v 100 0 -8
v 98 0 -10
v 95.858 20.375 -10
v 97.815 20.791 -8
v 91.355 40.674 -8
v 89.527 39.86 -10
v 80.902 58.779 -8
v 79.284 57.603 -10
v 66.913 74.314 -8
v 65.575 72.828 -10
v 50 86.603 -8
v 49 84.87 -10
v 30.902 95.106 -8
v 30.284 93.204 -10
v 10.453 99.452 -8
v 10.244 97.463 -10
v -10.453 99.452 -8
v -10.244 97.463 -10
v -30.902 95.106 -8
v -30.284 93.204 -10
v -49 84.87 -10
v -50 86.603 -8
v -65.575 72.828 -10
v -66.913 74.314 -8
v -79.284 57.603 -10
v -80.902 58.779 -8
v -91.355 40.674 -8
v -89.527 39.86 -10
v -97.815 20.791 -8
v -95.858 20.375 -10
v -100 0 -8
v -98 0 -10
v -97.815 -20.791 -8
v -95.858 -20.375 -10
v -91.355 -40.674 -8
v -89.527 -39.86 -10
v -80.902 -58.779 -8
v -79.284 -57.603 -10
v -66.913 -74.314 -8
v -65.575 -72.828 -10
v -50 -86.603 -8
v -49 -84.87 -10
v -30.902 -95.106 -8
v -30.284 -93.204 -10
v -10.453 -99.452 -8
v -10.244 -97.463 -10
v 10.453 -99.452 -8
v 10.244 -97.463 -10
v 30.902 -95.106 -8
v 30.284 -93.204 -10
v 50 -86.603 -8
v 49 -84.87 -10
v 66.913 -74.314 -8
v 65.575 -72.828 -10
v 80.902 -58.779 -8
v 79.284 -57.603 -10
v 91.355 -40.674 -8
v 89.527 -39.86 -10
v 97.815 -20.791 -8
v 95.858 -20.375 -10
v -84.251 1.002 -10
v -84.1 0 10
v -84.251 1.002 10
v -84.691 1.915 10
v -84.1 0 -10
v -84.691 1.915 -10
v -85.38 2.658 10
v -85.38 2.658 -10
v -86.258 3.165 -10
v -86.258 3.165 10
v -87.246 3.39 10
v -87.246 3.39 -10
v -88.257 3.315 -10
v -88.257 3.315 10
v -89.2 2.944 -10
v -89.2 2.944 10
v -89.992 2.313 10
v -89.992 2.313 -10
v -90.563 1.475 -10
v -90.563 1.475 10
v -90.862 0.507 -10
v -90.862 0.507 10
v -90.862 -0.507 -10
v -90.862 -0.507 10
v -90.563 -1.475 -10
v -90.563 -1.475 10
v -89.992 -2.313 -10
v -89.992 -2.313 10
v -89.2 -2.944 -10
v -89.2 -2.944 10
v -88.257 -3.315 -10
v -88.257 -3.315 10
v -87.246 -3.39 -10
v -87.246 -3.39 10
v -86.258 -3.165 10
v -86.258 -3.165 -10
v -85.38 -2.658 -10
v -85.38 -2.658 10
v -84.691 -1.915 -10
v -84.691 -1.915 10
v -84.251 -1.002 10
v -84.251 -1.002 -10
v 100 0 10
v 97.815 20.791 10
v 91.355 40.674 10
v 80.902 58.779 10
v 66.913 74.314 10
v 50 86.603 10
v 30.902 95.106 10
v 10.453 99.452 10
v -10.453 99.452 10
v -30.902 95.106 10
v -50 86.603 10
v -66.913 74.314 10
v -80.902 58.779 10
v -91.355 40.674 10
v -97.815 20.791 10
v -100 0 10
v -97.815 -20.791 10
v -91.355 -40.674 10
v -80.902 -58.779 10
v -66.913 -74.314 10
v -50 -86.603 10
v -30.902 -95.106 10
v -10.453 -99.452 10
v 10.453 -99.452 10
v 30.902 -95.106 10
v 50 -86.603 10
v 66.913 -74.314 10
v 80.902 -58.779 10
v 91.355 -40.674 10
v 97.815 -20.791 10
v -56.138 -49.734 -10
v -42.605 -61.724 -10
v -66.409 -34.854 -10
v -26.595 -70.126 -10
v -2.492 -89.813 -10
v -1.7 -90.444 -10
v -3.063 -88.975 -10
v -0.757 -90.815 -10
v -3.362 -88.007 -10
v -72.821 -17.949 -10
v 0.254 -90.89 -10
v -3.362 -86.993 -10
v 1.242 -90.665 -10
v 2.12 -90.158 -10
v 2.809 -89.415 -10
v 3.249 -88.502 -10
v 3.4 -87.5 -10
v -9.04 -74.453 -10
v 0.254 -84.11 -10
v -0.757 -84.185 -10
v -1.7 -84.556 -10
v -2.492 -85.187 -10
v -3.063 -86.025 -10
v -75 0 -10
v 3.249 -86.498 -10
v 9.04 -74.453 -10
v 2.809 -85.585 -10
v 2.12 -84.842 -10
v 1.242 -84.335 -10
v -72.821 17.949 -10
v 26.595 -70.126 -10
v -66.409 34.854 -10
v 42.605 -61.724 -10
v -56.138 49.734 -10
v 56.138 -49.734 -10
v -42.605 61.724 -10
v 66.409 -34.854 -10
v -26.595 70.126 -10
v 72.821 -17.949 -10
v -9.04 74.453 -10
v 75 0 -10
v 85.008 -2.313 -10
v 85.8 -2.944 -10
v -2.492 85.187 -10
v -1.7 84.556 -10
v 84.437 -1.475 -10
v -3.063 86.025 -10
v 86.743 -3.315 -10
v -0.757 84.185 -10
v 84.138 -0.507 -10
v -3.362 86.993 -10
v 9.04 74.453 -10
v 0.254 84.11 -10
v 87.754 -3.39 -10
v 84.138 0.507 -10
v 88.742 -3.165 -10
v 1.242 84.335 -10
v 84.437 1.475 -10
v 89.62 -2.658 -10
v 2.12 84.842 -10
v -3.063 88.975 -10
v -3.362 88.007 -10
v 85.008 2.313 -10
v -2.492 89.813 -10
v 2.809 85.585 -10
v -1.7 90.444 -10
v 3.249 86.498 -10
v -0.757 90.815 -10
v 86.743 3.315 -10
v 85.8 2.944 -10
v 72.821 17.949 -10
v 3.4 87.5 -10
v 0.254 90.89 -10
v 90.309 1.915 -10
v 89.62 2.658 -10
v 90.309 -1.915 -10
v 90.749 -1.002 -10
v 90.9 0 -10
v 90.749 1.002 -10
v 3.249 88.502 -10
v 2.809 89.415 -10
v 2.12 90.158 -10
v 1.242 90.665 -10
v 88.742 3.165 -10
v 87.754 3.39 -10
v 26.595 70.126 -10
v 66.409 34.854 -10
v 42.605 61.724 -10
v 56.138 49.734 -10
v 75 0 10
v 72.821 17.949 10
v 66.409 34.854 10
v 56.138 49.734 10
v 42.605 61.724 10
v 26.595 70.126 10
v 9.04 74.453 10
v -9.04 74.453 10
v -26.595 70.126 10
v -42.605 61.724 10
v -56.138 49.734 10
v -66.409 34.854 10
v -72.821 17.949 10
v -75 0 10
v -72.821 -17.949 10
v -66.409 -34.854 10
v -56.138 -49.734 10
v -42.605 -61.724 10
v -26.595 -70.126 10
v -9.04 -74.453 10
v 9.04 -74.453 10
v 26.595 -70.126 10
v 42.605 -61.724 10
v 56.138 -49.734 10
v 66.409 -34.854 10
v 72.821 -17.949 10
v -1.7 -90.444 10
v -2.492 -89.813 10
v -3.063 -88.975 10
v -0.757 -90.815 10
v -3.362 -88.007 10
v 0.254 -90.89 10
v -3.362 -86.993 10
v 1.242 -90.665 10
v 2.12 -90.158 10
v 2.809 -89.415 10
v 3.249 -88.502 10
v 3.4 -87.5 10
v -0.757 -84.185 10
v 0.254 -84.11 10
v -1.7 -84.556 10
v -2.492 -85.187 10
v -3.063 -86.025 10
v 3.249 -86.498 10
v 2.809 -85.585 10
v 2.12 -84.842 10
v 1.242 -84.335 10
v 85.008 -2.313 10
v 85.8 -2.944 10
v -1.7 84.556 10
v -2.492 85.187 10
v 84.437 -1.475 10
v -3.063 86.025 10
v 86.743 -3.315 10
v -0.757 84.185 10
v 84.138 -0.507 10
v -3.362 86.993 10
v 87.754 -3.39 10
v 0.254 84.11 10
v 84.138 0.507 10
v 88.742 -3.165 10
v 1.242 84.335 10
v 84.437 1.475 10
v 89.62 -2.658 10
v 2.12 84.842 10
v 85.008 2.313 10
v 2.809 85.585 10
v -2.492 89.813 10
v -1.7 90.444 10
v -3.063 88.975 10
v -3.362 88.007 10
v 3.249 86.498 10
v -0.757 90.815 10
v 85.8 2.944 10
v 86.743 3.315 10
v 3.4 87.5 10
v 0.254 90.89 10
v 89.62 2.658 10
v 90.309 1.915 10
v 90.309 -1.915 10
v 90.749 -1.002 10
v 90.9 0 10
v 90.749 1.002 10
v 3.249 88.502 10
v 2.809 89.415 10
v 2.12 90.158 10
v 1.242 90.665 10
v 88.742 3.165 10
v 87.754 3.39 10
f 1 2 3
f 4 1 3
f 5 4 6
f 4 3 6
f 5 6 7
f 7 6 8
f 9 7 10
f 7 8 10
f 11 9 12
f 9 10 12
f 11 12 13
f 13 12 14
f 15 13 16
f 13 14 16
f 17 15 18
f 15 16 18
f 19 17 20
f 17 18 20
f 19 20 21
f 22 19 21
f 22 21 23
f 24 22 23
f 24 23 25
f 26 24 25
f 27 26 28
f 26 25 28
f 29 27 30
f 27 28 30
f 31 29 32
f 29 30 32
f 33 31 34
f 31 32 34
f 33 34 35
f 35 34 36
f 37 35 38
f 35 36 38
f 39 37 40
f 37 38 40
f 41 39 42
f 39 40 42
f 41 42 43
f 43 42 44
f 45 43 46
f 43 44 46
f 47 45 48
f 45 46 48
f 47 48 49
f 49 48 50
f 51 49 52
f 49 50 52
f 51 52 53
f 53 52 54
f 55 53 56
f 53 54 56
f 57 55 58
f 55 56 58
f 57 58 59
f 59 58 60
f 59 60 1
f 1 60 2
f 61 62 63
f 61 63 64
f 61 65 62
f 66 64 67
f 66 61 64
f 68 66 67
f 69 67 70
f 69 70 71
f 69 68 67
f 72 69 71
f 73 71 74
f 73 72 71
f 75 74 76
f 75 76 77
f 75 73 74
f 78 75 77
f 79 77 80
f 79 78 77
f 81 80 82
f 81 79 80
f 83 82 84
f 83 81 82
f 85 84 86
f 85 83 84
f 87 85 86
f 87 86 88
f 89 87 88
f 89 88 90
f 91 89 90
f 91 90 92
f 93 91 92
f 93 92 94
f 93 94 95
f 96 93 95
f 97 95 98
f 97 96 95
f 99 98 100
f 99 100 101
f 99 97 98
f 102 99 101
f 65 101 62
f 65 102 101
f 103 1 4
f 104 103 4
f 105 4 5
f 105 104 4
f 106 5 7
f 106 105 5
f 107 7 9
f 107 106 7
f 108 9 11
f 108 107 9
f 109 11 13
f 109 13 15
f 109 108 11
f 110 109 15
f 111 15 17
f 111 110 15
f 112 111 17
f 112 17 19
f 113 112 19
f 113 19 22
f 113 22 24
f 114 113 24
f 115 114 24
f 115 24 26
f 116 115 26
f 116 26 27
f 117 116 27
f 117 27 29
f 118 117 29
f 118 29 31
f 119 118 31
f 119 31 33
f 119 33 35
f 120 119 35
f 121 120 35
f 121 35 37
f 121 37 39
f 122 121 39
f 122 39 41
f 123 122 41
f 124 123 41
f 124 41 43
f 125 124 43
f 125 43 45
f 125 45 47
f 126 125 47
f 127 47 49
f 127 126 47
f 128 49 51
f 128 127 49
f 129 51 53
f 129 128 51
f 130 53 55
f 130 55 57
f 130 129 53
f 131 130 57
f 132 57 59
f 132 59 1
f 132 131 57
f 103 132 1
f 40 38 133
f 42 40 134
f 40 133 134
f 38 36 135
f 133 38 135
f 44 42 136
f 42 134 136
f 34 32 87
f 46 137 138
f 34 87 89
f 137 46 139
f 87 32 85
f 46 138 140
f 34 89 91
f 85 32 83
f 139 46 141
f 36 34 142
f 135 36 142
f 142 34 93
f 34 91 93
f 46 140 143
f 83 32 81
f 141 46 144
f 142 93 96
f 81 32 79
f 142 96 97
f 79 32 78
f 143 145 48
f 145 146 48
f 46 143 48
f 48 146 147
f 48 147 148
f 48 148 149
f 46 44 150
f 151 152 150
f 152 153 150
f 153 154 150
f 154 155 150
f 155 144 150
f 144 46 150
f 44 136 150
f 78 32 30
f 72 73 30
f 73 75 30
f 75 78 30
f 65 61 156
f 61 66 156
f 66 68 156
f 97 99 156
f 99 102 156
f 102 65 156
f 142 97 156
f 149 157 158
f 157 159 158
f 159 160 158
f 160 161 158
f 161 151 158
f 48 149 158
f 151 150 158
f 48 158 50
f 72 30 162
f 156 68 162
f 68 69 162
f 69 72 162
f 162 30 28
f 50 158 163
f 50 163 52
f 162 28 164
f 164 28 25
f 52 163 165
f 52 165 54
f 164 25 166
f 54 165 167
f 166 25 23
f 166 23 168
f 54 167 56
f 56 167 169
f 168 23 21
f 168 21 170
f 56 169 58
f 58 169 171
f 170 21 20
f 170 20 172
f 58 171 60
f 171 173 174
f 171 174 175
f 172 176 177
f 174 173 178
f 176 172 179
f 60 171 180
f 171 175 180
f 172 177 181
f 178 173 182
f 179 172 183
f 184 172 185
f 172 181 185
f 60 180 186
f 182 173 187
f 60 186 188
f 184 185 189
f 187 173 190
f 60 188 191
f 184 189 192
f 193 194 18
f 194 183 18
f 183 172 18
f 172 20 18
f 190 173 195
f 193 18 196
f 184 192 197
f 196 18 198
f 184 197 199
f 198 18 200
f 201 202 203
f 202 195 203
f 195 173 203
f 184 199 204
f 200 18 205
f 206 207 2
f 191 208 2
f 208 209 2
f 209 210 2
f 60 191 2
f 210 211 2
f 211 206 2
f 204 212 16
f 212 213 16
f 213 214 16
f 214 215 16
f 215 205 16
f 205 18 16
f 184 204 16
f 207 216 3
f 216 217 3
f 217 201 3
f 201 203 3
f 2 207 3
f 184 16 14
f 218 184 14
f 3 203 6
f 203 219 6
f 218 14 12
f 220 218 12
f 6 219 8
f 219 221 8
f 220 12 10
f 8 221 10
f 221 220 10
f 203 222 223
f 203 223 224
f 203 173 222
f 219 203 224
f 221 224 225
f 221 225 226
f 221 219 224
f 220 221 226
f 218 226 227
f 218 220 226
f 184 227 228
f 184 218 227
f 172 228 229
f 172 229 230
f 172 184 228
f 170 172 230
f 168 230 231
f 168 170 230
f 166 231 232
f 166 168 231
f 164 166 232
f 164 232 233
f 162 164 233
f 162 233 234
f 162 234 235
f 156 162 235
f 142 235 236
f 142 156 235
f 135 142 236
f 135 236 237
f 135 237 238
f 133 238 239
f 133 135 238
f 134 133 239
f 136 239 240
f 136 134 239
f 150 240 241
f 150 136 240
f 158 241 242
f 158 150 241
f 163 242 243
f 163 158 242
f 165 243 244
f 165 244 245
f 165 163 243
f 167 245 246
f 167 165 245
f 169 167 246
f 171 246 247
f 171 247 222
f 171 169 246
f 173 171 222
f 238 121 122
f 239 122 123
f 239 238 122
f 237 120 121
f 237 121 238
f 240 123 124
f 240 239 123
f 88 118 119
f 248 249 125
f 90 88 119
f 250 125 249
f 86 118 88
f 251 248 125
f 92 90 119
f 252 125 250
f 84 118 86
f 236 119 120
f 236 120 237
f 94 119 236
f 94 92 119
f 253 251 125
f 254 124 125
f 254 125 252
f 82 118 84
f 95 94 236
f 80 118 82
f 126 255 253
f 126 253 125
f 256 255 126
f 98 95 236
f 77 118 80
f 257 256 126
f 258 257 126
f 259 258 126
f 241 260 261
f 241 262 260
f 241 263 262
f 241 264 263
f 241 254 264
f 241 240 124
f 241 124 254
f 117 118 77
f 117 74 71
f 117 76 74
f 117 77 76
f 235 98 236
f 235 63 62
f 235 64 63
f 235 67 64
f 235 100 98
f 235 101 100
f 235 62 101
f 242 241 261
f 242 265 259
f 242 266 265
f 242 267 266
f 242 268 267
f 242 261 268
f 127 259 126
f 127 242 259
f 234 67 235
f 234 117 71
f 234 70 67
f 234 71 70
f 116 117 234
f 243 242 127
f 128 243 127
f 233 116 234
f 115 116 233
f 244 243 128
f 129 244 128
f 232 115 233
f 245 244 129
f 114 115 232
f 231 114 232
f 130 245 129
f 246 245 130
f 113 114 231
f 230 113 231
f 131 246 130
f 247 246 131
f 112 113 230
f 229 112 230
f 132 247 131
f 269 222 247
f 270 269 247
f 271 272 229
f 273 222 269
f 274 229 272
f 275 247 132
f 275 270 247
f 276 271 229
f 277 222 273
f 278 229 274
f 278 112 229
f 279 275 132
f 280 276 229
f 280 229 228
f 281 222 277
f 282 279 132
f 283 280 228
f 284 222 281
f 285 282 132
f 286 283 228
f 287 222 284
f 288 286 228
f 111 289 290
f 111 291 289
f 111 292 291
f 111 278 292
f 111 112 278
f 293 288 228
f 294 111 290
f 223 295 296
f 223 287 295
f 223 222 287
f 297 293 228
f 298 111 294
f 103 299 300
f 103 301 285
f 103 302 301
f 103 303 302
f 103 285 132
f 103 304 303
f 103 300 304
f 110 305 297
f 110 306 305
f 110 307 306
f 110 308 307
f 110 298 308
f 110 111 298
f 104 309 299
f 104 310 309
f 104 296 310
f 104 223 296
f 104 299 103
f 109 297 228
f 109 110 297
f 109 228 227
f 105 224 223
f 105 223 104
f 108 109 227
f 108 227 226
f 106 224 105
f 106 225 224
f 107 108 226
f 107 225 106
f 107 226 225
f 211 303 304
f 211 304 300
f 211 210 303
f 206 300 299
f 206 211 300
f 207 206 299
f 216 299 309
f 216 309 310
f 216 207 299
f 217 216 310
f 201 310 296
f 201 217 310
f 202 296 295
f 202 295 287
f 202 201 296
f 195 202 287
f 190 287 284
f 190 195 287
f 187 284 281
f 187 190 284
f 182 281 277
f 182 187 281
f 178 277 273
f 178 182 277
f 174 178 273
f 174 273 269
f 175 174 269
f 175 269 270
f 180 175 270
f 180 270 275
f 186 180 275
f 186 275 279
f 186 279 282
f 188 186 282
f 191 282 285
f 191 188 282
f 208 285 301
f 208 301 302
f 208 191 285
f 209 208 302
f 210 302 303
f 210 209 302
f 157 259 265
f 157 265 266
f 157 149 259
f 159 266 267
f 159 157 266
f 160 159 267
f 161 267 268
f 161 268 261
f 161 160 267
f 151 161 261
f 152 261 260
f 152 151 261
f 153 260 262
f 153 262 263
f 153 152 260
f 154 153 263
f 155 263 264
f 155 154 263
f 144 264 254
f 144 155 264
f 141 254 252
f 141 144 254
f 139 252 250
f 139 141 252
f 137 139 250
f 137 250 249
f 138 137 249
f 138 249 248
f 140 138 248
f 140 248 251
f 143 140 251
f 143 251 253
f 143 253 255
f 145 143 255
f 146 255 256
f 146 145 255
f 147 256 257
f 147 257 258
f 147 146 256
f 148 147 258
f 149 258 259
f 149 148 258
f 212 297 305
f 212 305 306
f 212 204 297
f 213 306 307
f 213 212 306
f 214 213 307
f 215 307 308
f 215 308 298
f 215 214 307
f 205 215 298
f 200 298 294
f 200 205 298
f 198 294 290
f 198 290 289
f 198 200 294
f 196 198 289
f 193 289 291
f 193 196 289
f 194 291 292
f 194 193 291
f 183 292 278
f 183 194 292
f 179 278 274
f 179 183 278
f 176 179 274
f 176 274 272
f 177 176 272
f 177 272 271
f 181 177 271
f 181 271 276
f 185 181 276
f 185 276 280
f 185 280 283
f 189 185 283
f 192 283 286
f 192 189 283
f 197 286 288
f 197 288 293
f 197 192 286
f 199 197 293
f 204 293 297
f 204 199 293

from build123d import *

# Parameters (mm, degrees)
SZKIC1_R                    = 100
SZKIC1_R_2                  = 75
SZKIC1_R_3                  = 3.4
DODANIE_WYCI_GNI_CIE1_DEPTH = 10
SFAZOWANIE1_SIZE            = 2


with BuildPart() as part:
    # Szkic1 → Dodanie-wyciągnięcie1 (new, symmetric)
    with BuildSketch(Plane.XY):
        Circle(SZKIC1_R)
        Circle(SZKIC1_R_2, mode=Mode.SUBTRACT)
        with Locations((0, 87.5)):
            Circle(SZKIC1_R_3, mode=Mode.SUBTRACT)
        with Locations((87.5, 0)):
            Circle(SZKIC1_R_3, mode=Mode.SUBTRACT)
        with Locations((0, -87.5)):
            Circle(SZKIC1_R_3, mode=Mode.SUBTRACT)
        with Locations((-87.5, 0)):
            Circle(SZKIC1_R_3, mode=Mode.SUBTRACT)
    extrude(amount=DODANIE_WYCI_GNI_CIE1_DEPTH, both=True)

    # Sfazowanie1
    sfazowanie1_edges = [part.edges().sort_by_distance(p)[0] for p in [
        (-100, 0, -10),
    ]]
    chamfer(sfazowanie1_edges, length=SFAZOWANIE1_SIZE)


solid = part.part
